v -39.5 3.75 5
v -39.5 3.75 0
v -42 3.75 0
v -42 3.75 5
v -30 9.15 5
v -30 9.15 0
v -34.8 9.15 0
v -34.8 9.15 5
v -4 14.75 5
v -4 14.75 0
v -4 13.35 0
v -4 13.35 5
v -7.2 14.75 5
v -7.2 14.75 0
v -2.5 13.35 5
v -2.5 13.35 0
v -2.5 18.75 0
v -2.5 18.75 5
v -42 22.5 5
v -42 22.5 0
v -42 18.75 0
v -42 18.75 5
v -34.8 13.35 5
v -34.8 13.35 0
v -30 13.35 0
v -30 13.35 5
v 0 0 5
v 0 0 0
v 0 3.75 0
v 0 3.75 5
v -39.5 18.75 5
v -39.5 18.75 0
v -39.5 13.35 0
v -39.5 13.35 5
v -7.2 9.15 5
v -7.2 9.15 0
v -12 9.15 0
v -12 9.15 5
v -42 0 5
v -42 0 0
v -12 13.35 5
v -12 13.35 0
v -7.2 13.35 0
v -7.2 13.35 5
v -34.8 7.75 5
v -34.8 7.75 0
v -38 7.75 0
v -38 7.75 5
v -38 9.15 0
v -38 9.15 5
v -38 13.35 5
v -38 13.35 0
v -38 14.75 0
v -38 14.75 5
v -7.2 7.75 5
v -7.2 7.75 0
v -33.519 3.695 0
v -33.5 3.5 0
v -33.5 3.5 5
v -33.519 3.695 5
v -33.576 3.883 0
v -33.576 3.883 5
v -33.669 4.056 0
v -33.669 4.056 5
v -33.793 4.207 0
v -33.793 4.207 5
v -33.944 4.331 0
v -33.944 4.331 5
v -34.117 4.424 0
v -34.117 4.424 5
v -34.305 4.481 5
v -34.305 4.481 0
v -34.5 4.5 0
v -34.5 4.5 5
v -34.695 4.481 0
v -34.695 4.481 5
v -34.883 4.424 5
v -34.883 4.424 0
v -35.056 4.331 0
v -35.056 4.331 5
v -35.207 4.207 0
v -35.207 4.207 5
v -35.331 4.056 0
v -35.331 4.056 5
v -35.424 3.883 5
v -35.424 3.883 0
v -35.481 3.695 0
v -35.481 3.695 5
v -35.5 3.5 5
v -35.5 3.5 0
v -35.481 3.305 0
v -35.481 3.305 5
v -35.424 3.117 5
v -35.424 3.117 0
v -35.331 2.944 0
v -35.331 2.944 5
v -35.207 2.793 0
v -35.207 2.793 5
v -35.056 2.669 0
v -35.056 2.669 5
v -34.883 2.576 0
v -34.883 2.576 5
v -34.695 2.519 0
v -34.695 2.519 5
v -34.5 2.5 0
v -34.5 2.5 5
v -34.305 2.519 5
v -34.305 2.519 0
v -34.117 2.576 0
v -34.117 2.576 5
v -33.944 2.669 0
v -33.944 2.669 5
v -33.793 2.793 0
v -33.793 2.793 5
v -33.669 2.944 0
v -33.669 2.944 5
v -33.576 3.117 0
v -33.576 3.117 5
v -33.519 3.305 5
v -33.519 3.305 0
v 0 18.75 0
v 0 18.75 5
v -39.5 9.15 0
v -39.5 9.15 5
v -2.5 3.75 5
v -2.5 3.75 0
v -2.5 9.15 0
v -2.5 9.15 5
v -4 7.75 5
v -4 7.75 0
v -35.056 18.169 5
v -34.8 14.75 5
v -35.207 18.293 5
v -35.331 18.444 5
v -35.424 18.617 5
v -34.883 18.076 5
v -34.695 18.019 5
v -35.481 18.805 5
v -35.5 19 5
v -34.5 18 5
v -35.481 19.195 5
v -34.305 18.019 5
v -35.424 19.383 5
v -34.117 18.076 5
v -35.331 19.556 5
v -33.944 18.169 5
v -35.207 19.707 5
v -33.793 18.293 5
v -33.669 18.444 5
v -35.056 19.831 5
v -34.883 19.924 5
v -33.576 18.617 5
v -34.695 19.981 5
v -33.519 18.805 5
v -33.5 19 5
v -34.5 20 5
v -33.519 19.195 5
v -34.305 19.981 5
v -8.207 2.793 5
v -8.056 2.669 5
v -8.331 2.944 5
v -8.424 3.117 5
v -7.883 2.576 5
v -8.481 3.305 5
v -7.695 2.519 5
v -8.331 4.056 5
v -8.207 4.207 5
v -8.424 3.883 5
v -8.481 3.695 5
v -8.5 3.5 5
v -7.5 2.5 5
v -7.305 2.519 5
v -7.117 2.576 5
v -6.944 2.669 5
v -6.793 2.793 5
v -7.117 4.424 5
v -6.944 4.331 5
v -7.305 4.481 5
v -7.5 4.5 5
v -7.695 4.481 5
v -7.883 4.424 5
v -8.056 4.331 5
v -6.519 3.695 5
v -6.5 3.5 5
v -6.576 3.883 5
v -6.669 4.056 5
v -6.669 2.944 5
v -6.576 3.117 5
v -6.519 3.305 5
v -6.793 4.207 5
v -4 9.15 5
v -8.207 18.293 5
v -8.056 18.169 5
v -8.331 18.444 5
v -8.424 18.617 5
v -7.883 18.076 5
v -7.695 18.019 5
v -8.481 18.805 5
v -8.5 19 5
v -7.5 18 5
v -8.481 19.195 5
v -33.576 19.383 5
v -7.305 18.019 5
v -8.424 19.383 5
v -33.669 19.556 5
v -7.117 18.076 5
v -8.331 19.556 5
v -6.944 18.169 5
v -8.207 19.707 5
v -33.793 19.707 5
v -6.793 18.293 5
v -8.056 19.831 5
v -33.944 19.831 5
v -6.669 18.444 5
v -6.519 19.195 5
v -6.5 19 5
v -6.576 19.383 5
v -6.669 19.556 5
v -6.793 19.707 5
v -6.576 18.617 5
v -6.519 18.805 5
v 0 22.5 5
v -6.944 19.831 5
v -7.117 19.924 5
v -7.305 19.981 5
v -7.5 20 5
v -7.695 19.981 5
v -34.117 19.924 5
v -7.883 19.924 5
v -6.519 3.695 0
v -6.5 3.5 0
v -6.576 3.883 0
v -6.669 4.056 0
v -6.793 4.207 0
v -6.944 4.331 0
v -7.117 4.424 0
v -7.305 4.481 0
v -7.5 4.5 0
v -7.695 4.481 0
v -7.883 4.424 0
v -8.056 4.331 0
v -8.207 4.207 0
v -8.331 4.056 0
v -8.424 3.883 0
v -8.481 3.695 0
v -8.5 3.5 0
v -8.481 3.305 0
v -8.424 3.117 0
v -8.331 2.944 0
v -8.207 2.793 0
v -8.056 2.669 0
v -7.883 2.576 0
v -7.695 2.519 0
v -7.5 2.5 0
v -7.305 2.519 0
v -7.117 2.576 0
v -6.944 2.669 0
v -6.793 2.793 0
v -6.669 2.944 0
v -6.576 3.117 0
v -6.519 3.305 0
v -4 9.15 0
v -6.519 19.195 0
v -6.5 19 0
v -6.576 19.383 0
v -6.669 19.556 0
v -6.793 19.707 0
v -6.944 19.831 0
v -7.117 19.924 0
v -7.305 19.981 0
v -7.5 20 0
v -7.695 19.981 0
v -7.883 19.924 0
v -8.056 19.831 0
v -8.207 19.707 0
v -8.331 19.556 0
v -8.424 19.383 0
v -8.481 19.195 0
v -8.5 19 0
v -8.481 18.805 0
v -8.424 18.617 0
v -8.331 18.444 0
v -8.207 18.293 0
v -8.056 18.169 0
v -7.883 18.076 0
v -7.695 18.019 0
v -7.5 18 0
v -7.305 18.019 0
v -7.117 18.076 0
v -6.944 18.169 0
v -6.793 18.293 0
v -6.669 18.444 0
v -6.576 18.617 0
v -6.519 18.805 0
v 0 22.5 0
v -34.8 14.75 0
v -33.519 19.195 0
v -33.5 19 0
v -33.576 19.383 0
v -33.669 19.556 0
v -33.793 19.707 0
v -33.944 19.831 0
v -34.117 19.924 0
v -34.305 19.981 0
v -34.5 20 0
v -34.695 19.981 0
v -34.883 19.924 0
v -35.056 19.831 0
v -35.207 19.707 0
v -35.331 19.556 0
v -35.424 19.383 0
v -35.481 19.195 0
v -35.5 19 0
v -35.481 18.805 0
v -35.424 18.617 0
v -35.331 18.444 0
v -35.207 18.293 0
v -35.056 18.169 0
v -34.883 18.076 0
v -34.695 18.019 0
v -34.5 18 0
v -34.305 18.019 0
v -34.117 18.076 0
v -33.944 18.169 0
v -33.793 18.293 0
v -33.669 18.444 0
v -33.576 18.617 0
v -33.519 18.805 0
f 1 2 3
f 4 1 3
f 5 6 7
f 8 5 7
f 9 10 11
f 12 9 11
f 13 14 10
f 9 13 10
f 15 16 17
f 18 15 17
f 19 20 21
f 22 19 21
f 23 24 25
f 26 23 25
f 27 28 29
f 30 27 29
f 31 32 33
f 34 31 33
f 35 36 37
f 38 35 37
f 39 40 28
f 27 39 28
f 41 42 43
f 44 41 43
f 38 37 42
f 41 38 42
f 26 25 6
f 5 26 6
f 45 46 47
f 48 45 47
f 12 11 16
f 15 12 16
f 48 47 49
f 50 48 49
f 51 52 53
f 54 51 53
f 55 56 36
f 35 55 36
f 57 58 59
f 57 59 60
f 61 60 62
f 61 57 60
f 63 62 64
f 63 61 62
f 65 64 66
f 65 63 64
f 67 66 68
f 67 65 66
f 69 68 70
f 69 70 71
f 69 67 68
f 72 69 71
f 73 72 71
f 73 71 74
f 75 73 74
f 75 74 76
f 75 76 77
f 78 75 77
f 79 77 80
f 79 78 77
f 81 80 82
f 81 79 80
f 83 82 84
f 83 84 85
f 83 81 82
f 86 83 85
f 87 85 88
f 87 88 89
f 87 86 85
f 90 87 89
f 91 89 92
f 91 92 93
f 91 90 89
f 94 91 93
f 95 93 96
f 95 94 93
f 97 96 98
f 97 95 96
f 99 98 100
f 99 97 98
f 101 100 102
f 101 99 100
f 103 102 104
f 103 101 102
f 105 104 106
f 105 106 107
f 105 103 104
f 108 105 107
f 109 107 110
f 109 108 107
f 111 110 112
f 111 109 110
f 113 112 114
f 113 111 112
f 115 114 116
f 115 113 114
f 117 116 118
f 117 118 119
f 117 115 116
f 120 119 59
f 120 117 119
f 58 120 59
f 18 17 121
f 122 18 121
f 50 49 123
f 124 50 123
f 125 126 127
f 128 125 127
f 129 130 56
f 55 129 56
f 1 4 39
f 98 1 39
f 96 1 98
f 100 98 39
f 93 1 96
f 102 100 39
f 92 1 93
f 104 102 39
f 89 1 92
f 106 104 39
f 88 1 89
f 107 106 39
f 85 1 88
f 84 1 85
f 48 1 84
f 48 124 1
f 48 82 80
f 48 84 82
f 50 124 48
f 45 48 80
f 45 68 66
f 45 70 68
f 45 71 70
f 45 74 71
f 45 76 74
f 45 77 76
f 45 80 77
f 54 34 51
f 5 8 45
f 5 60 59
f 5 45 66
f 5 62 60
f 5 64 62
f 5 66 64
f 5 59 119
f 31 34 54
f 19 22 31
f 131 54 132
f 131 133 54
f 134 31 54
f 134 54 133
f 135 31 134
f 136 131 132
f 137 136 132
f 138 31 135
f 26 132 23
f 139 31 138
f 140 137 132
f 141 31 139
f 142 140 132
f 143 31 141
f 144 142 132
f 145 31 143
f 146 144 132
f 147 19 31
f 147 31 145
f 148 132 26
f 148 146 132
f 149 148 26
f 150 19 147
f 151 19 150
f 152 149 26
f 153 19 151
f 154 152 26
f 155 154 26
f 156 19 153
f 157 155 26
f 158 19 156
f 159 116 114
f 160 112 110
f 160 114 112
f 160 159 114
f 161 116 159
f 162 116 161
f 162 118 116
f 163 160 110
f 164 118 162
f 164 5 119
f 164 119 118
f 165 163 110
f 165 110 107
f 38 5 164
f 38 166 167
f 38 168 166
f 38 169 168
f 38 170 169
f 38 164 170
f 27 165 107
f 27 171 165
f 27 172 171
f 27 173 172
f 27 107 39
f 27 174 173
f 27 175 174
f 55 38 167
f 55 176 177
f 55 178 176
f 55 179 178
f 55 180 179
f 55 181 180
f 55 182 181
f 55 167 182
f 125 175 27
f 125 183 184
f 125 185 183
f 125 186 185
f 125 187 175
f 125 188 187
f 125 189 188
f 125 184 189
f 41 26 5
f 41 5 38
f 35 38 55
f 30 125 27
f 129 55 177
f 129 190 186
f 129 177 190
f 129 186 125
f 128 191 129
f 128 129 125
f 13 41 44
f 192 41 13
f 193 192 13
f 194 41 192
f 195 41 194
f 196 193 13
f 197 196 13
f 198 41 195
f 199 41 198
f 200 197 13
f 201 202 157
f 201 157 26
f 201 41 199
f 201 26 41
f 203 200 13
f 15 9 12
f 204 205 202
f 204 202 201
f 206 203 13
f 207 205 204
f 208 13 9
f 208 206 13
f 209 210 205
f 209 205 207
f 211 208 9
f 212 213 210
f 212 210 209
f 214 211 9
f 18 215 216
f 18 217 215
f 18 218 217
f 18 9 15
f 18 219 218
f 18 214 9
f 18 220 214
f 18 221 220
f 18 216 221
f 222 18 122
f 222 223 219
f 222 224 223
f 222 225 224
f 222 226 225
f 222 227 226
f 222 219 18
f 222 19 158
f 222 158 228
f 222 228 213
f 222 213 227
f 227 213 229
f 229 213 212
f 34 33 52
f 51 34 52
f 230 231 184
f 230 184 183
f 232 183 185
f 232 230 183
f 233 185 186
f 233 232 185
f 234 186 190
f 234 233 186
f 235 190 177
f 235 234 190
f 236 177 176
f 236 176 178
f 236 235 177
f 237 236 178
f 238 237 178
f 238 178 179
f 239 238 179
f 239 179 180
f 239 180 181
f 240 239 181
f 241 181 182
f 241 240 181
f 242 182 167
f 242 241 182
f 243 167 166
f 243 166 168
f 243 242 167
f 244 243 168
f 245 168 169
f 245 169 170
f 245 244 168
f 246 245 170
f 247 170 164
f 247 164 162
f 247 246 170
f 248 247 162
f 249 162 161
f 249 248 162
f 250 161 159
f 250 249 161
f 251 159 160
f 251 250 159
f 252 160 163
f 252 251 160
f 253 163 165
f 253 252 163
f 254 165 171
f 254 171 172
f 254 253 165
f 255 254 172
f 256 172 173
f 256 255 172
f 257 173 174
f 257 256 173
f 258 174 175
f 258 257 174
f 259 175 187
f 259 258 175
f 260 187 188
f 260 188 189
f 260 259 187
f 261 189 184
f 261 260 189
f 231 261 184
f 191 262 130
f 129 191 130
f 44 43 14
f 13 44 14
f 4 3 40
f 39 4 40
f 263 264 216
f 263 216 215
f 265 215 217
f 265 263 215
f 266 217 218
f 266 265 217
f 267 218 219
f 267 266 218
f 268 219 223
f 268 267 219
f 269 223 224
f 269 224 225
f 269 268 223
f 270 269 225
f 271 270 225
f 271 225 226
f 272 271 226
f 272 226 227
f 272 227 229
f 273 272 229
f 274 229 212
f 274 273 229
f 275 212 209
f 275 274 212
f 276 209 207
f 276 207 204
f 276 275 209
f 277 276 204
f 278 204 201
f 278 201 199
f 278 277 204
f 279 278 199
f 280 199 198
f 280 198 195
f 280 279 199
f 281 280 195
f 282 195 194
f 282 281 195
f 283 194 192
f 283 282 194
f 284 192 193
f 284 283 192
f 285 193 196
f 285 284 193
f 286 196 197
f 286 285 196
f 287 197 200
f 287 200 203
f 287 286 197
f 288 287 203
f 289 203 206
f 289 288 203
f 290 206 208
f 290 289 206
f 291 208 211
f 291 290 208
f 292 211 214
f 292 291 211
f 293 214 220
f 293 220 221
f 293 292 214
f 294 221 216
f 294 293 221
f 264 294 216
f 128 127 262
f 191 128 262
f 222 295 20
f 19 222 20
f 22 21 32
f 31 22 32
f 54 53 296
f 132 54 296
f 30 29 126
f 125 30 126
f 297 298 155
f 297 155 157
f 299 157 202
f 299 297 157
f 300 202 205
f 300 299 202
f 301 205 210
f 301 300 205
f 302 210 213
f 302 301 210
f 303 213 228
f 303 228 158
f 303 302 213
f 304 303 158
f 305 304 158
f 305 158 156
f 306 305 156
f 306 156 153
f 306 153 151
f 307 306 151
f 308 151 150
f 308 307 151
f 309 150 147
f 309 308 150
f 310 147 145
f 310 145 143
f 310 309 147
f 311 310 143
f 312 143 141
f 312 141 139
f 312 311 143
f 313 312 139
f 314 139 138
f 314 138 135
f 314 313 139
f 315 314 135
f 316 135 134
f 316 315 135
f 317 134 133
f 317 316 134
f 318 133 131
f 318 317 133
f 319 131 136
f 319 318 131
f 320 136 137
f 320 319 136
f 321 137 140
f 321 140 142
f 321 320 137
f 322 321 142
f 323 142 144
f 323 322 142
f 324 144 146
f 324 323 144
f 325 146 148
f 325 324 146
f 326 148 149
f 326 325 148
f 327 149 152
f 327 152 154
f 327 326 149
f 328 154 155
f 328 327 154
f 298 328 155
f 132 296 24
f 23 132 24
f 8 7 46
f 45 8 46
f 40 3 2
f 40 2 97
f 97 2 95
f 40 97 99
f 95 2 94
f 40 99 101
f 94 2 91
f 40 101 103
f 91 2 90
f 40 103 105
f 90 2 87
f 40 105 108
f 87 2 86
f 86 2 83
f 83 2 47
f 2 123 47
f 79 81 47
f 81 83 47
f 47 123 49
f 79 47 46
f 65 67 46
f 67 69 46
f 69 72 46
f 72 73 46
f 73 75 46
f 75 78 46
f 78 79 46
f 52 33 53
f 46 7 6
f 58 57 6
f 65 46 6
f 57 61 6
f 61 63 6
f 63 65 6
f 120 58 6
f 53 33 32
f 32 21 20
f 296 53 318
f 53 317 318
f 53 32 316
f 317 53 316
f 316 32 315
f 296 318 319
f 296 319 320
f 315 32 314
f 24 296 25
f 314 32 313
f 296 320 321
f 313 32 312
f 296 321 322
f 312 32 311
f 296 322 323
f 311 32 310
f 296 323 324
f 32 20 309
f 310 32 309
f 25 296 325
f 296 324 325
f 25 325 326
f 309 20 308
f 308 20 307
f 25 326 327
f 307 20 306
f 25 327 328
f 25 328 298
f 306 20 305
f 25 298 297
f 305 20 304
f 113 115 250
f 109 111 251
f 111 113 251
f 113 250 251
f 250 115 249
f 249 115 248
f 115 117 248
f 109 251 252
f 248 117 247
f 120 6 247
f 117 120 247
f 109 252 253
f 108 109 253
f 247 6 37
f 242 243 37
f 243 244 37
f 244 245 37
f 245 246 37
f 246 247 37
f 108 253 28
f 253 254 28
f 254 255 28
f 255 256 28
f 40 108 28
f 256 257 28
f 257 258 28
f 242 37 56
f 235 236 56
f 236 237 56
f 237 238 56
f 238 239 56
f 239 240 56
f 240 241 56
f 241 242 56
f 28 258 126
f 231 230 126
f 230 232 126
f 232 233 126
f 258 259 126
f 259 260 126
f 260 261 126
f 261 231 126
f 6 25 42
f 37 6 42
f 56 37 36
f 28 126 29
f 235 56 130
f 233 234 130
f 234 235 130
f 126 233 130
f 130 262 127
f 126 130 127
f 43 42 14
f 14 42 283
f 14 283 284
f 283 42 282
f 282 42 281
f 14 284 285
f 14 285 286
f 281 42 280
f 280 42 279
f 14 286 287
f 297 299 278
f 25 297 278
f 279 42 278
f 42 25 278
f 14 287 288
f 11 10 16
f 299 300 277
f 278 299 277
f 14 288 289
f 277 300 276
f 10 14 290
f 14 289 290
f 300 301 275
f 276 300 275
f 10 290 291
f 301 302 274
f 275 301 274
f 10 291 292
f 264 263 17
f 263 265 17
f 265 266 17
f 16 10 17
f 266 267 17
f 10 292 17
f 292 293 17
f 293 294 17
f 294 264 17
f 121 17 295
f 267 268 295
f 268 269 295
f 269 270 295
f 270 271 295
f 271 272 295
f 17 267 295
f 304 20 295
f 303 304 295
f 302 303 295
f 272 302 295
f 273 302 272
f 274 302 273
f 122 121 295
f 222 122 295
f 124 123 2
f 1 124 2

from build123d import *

# Parameters (mm, degrees)
ESQUISSE1_R        = 1
BOSS_EXTRU_1_DEPTH = 5


with BuildPart() as part:
    # Esquisse1 → Boss.-Extru.1 (new body)
    with BuildSketch(Plane.XY):
        Polygon((-7.2, 14.75), (-4, 14.75), (-4, 13.35), (-2.5, 13.35), (-2.5, 18.75), (0, 18.75), (0, 22.5), (-42, 22.5), (-42, 18.75), (-39.5, 18.75), (-39.5, 13.35), (-38, 13.35), (-38, 14.75), (-34.8, 14.75), (-34.8, 13.35), (-30, 13.35), (-30, 9.15), (-34.8, 9.15), (-34.8, 7.75), (-38, 7.75), (-38, 9.15), (-39.5, 9.15), (-39.5, 3.75), (-42, 3.75), (-42, 0), (0, 0), (0, 3.75), (-2.5, 3.75), (-2.5, 9.15), (-4, 9.15), (-4, 7.75), (-7.2, 7.75), (-7.2, 9.15), (-12, 9.15), (-12, 13.35), (-7.2, 13.35), align=None)
        with Locations((-34.5, 3.5)):
            Circle(ESQUISSE1_R, mode=Mode.SUBTRACT)
        with Locations((-7.5, 3.5)):
            Circle(ESQUISSE1_R, mode=Mode.SUBTRACT)
        with Locations((-34.5, 19)):
            Circle(ESQUISSE1_R, mode=Mode.SUBTRACT)
        with Locations((-7.5, 19)):
            Circle(ESQUISSE1_R, mode=Mode.SUBTRACT)
    extrude(amount=BOSS_EXTRU_1_DEPTH)


solid = part.part
